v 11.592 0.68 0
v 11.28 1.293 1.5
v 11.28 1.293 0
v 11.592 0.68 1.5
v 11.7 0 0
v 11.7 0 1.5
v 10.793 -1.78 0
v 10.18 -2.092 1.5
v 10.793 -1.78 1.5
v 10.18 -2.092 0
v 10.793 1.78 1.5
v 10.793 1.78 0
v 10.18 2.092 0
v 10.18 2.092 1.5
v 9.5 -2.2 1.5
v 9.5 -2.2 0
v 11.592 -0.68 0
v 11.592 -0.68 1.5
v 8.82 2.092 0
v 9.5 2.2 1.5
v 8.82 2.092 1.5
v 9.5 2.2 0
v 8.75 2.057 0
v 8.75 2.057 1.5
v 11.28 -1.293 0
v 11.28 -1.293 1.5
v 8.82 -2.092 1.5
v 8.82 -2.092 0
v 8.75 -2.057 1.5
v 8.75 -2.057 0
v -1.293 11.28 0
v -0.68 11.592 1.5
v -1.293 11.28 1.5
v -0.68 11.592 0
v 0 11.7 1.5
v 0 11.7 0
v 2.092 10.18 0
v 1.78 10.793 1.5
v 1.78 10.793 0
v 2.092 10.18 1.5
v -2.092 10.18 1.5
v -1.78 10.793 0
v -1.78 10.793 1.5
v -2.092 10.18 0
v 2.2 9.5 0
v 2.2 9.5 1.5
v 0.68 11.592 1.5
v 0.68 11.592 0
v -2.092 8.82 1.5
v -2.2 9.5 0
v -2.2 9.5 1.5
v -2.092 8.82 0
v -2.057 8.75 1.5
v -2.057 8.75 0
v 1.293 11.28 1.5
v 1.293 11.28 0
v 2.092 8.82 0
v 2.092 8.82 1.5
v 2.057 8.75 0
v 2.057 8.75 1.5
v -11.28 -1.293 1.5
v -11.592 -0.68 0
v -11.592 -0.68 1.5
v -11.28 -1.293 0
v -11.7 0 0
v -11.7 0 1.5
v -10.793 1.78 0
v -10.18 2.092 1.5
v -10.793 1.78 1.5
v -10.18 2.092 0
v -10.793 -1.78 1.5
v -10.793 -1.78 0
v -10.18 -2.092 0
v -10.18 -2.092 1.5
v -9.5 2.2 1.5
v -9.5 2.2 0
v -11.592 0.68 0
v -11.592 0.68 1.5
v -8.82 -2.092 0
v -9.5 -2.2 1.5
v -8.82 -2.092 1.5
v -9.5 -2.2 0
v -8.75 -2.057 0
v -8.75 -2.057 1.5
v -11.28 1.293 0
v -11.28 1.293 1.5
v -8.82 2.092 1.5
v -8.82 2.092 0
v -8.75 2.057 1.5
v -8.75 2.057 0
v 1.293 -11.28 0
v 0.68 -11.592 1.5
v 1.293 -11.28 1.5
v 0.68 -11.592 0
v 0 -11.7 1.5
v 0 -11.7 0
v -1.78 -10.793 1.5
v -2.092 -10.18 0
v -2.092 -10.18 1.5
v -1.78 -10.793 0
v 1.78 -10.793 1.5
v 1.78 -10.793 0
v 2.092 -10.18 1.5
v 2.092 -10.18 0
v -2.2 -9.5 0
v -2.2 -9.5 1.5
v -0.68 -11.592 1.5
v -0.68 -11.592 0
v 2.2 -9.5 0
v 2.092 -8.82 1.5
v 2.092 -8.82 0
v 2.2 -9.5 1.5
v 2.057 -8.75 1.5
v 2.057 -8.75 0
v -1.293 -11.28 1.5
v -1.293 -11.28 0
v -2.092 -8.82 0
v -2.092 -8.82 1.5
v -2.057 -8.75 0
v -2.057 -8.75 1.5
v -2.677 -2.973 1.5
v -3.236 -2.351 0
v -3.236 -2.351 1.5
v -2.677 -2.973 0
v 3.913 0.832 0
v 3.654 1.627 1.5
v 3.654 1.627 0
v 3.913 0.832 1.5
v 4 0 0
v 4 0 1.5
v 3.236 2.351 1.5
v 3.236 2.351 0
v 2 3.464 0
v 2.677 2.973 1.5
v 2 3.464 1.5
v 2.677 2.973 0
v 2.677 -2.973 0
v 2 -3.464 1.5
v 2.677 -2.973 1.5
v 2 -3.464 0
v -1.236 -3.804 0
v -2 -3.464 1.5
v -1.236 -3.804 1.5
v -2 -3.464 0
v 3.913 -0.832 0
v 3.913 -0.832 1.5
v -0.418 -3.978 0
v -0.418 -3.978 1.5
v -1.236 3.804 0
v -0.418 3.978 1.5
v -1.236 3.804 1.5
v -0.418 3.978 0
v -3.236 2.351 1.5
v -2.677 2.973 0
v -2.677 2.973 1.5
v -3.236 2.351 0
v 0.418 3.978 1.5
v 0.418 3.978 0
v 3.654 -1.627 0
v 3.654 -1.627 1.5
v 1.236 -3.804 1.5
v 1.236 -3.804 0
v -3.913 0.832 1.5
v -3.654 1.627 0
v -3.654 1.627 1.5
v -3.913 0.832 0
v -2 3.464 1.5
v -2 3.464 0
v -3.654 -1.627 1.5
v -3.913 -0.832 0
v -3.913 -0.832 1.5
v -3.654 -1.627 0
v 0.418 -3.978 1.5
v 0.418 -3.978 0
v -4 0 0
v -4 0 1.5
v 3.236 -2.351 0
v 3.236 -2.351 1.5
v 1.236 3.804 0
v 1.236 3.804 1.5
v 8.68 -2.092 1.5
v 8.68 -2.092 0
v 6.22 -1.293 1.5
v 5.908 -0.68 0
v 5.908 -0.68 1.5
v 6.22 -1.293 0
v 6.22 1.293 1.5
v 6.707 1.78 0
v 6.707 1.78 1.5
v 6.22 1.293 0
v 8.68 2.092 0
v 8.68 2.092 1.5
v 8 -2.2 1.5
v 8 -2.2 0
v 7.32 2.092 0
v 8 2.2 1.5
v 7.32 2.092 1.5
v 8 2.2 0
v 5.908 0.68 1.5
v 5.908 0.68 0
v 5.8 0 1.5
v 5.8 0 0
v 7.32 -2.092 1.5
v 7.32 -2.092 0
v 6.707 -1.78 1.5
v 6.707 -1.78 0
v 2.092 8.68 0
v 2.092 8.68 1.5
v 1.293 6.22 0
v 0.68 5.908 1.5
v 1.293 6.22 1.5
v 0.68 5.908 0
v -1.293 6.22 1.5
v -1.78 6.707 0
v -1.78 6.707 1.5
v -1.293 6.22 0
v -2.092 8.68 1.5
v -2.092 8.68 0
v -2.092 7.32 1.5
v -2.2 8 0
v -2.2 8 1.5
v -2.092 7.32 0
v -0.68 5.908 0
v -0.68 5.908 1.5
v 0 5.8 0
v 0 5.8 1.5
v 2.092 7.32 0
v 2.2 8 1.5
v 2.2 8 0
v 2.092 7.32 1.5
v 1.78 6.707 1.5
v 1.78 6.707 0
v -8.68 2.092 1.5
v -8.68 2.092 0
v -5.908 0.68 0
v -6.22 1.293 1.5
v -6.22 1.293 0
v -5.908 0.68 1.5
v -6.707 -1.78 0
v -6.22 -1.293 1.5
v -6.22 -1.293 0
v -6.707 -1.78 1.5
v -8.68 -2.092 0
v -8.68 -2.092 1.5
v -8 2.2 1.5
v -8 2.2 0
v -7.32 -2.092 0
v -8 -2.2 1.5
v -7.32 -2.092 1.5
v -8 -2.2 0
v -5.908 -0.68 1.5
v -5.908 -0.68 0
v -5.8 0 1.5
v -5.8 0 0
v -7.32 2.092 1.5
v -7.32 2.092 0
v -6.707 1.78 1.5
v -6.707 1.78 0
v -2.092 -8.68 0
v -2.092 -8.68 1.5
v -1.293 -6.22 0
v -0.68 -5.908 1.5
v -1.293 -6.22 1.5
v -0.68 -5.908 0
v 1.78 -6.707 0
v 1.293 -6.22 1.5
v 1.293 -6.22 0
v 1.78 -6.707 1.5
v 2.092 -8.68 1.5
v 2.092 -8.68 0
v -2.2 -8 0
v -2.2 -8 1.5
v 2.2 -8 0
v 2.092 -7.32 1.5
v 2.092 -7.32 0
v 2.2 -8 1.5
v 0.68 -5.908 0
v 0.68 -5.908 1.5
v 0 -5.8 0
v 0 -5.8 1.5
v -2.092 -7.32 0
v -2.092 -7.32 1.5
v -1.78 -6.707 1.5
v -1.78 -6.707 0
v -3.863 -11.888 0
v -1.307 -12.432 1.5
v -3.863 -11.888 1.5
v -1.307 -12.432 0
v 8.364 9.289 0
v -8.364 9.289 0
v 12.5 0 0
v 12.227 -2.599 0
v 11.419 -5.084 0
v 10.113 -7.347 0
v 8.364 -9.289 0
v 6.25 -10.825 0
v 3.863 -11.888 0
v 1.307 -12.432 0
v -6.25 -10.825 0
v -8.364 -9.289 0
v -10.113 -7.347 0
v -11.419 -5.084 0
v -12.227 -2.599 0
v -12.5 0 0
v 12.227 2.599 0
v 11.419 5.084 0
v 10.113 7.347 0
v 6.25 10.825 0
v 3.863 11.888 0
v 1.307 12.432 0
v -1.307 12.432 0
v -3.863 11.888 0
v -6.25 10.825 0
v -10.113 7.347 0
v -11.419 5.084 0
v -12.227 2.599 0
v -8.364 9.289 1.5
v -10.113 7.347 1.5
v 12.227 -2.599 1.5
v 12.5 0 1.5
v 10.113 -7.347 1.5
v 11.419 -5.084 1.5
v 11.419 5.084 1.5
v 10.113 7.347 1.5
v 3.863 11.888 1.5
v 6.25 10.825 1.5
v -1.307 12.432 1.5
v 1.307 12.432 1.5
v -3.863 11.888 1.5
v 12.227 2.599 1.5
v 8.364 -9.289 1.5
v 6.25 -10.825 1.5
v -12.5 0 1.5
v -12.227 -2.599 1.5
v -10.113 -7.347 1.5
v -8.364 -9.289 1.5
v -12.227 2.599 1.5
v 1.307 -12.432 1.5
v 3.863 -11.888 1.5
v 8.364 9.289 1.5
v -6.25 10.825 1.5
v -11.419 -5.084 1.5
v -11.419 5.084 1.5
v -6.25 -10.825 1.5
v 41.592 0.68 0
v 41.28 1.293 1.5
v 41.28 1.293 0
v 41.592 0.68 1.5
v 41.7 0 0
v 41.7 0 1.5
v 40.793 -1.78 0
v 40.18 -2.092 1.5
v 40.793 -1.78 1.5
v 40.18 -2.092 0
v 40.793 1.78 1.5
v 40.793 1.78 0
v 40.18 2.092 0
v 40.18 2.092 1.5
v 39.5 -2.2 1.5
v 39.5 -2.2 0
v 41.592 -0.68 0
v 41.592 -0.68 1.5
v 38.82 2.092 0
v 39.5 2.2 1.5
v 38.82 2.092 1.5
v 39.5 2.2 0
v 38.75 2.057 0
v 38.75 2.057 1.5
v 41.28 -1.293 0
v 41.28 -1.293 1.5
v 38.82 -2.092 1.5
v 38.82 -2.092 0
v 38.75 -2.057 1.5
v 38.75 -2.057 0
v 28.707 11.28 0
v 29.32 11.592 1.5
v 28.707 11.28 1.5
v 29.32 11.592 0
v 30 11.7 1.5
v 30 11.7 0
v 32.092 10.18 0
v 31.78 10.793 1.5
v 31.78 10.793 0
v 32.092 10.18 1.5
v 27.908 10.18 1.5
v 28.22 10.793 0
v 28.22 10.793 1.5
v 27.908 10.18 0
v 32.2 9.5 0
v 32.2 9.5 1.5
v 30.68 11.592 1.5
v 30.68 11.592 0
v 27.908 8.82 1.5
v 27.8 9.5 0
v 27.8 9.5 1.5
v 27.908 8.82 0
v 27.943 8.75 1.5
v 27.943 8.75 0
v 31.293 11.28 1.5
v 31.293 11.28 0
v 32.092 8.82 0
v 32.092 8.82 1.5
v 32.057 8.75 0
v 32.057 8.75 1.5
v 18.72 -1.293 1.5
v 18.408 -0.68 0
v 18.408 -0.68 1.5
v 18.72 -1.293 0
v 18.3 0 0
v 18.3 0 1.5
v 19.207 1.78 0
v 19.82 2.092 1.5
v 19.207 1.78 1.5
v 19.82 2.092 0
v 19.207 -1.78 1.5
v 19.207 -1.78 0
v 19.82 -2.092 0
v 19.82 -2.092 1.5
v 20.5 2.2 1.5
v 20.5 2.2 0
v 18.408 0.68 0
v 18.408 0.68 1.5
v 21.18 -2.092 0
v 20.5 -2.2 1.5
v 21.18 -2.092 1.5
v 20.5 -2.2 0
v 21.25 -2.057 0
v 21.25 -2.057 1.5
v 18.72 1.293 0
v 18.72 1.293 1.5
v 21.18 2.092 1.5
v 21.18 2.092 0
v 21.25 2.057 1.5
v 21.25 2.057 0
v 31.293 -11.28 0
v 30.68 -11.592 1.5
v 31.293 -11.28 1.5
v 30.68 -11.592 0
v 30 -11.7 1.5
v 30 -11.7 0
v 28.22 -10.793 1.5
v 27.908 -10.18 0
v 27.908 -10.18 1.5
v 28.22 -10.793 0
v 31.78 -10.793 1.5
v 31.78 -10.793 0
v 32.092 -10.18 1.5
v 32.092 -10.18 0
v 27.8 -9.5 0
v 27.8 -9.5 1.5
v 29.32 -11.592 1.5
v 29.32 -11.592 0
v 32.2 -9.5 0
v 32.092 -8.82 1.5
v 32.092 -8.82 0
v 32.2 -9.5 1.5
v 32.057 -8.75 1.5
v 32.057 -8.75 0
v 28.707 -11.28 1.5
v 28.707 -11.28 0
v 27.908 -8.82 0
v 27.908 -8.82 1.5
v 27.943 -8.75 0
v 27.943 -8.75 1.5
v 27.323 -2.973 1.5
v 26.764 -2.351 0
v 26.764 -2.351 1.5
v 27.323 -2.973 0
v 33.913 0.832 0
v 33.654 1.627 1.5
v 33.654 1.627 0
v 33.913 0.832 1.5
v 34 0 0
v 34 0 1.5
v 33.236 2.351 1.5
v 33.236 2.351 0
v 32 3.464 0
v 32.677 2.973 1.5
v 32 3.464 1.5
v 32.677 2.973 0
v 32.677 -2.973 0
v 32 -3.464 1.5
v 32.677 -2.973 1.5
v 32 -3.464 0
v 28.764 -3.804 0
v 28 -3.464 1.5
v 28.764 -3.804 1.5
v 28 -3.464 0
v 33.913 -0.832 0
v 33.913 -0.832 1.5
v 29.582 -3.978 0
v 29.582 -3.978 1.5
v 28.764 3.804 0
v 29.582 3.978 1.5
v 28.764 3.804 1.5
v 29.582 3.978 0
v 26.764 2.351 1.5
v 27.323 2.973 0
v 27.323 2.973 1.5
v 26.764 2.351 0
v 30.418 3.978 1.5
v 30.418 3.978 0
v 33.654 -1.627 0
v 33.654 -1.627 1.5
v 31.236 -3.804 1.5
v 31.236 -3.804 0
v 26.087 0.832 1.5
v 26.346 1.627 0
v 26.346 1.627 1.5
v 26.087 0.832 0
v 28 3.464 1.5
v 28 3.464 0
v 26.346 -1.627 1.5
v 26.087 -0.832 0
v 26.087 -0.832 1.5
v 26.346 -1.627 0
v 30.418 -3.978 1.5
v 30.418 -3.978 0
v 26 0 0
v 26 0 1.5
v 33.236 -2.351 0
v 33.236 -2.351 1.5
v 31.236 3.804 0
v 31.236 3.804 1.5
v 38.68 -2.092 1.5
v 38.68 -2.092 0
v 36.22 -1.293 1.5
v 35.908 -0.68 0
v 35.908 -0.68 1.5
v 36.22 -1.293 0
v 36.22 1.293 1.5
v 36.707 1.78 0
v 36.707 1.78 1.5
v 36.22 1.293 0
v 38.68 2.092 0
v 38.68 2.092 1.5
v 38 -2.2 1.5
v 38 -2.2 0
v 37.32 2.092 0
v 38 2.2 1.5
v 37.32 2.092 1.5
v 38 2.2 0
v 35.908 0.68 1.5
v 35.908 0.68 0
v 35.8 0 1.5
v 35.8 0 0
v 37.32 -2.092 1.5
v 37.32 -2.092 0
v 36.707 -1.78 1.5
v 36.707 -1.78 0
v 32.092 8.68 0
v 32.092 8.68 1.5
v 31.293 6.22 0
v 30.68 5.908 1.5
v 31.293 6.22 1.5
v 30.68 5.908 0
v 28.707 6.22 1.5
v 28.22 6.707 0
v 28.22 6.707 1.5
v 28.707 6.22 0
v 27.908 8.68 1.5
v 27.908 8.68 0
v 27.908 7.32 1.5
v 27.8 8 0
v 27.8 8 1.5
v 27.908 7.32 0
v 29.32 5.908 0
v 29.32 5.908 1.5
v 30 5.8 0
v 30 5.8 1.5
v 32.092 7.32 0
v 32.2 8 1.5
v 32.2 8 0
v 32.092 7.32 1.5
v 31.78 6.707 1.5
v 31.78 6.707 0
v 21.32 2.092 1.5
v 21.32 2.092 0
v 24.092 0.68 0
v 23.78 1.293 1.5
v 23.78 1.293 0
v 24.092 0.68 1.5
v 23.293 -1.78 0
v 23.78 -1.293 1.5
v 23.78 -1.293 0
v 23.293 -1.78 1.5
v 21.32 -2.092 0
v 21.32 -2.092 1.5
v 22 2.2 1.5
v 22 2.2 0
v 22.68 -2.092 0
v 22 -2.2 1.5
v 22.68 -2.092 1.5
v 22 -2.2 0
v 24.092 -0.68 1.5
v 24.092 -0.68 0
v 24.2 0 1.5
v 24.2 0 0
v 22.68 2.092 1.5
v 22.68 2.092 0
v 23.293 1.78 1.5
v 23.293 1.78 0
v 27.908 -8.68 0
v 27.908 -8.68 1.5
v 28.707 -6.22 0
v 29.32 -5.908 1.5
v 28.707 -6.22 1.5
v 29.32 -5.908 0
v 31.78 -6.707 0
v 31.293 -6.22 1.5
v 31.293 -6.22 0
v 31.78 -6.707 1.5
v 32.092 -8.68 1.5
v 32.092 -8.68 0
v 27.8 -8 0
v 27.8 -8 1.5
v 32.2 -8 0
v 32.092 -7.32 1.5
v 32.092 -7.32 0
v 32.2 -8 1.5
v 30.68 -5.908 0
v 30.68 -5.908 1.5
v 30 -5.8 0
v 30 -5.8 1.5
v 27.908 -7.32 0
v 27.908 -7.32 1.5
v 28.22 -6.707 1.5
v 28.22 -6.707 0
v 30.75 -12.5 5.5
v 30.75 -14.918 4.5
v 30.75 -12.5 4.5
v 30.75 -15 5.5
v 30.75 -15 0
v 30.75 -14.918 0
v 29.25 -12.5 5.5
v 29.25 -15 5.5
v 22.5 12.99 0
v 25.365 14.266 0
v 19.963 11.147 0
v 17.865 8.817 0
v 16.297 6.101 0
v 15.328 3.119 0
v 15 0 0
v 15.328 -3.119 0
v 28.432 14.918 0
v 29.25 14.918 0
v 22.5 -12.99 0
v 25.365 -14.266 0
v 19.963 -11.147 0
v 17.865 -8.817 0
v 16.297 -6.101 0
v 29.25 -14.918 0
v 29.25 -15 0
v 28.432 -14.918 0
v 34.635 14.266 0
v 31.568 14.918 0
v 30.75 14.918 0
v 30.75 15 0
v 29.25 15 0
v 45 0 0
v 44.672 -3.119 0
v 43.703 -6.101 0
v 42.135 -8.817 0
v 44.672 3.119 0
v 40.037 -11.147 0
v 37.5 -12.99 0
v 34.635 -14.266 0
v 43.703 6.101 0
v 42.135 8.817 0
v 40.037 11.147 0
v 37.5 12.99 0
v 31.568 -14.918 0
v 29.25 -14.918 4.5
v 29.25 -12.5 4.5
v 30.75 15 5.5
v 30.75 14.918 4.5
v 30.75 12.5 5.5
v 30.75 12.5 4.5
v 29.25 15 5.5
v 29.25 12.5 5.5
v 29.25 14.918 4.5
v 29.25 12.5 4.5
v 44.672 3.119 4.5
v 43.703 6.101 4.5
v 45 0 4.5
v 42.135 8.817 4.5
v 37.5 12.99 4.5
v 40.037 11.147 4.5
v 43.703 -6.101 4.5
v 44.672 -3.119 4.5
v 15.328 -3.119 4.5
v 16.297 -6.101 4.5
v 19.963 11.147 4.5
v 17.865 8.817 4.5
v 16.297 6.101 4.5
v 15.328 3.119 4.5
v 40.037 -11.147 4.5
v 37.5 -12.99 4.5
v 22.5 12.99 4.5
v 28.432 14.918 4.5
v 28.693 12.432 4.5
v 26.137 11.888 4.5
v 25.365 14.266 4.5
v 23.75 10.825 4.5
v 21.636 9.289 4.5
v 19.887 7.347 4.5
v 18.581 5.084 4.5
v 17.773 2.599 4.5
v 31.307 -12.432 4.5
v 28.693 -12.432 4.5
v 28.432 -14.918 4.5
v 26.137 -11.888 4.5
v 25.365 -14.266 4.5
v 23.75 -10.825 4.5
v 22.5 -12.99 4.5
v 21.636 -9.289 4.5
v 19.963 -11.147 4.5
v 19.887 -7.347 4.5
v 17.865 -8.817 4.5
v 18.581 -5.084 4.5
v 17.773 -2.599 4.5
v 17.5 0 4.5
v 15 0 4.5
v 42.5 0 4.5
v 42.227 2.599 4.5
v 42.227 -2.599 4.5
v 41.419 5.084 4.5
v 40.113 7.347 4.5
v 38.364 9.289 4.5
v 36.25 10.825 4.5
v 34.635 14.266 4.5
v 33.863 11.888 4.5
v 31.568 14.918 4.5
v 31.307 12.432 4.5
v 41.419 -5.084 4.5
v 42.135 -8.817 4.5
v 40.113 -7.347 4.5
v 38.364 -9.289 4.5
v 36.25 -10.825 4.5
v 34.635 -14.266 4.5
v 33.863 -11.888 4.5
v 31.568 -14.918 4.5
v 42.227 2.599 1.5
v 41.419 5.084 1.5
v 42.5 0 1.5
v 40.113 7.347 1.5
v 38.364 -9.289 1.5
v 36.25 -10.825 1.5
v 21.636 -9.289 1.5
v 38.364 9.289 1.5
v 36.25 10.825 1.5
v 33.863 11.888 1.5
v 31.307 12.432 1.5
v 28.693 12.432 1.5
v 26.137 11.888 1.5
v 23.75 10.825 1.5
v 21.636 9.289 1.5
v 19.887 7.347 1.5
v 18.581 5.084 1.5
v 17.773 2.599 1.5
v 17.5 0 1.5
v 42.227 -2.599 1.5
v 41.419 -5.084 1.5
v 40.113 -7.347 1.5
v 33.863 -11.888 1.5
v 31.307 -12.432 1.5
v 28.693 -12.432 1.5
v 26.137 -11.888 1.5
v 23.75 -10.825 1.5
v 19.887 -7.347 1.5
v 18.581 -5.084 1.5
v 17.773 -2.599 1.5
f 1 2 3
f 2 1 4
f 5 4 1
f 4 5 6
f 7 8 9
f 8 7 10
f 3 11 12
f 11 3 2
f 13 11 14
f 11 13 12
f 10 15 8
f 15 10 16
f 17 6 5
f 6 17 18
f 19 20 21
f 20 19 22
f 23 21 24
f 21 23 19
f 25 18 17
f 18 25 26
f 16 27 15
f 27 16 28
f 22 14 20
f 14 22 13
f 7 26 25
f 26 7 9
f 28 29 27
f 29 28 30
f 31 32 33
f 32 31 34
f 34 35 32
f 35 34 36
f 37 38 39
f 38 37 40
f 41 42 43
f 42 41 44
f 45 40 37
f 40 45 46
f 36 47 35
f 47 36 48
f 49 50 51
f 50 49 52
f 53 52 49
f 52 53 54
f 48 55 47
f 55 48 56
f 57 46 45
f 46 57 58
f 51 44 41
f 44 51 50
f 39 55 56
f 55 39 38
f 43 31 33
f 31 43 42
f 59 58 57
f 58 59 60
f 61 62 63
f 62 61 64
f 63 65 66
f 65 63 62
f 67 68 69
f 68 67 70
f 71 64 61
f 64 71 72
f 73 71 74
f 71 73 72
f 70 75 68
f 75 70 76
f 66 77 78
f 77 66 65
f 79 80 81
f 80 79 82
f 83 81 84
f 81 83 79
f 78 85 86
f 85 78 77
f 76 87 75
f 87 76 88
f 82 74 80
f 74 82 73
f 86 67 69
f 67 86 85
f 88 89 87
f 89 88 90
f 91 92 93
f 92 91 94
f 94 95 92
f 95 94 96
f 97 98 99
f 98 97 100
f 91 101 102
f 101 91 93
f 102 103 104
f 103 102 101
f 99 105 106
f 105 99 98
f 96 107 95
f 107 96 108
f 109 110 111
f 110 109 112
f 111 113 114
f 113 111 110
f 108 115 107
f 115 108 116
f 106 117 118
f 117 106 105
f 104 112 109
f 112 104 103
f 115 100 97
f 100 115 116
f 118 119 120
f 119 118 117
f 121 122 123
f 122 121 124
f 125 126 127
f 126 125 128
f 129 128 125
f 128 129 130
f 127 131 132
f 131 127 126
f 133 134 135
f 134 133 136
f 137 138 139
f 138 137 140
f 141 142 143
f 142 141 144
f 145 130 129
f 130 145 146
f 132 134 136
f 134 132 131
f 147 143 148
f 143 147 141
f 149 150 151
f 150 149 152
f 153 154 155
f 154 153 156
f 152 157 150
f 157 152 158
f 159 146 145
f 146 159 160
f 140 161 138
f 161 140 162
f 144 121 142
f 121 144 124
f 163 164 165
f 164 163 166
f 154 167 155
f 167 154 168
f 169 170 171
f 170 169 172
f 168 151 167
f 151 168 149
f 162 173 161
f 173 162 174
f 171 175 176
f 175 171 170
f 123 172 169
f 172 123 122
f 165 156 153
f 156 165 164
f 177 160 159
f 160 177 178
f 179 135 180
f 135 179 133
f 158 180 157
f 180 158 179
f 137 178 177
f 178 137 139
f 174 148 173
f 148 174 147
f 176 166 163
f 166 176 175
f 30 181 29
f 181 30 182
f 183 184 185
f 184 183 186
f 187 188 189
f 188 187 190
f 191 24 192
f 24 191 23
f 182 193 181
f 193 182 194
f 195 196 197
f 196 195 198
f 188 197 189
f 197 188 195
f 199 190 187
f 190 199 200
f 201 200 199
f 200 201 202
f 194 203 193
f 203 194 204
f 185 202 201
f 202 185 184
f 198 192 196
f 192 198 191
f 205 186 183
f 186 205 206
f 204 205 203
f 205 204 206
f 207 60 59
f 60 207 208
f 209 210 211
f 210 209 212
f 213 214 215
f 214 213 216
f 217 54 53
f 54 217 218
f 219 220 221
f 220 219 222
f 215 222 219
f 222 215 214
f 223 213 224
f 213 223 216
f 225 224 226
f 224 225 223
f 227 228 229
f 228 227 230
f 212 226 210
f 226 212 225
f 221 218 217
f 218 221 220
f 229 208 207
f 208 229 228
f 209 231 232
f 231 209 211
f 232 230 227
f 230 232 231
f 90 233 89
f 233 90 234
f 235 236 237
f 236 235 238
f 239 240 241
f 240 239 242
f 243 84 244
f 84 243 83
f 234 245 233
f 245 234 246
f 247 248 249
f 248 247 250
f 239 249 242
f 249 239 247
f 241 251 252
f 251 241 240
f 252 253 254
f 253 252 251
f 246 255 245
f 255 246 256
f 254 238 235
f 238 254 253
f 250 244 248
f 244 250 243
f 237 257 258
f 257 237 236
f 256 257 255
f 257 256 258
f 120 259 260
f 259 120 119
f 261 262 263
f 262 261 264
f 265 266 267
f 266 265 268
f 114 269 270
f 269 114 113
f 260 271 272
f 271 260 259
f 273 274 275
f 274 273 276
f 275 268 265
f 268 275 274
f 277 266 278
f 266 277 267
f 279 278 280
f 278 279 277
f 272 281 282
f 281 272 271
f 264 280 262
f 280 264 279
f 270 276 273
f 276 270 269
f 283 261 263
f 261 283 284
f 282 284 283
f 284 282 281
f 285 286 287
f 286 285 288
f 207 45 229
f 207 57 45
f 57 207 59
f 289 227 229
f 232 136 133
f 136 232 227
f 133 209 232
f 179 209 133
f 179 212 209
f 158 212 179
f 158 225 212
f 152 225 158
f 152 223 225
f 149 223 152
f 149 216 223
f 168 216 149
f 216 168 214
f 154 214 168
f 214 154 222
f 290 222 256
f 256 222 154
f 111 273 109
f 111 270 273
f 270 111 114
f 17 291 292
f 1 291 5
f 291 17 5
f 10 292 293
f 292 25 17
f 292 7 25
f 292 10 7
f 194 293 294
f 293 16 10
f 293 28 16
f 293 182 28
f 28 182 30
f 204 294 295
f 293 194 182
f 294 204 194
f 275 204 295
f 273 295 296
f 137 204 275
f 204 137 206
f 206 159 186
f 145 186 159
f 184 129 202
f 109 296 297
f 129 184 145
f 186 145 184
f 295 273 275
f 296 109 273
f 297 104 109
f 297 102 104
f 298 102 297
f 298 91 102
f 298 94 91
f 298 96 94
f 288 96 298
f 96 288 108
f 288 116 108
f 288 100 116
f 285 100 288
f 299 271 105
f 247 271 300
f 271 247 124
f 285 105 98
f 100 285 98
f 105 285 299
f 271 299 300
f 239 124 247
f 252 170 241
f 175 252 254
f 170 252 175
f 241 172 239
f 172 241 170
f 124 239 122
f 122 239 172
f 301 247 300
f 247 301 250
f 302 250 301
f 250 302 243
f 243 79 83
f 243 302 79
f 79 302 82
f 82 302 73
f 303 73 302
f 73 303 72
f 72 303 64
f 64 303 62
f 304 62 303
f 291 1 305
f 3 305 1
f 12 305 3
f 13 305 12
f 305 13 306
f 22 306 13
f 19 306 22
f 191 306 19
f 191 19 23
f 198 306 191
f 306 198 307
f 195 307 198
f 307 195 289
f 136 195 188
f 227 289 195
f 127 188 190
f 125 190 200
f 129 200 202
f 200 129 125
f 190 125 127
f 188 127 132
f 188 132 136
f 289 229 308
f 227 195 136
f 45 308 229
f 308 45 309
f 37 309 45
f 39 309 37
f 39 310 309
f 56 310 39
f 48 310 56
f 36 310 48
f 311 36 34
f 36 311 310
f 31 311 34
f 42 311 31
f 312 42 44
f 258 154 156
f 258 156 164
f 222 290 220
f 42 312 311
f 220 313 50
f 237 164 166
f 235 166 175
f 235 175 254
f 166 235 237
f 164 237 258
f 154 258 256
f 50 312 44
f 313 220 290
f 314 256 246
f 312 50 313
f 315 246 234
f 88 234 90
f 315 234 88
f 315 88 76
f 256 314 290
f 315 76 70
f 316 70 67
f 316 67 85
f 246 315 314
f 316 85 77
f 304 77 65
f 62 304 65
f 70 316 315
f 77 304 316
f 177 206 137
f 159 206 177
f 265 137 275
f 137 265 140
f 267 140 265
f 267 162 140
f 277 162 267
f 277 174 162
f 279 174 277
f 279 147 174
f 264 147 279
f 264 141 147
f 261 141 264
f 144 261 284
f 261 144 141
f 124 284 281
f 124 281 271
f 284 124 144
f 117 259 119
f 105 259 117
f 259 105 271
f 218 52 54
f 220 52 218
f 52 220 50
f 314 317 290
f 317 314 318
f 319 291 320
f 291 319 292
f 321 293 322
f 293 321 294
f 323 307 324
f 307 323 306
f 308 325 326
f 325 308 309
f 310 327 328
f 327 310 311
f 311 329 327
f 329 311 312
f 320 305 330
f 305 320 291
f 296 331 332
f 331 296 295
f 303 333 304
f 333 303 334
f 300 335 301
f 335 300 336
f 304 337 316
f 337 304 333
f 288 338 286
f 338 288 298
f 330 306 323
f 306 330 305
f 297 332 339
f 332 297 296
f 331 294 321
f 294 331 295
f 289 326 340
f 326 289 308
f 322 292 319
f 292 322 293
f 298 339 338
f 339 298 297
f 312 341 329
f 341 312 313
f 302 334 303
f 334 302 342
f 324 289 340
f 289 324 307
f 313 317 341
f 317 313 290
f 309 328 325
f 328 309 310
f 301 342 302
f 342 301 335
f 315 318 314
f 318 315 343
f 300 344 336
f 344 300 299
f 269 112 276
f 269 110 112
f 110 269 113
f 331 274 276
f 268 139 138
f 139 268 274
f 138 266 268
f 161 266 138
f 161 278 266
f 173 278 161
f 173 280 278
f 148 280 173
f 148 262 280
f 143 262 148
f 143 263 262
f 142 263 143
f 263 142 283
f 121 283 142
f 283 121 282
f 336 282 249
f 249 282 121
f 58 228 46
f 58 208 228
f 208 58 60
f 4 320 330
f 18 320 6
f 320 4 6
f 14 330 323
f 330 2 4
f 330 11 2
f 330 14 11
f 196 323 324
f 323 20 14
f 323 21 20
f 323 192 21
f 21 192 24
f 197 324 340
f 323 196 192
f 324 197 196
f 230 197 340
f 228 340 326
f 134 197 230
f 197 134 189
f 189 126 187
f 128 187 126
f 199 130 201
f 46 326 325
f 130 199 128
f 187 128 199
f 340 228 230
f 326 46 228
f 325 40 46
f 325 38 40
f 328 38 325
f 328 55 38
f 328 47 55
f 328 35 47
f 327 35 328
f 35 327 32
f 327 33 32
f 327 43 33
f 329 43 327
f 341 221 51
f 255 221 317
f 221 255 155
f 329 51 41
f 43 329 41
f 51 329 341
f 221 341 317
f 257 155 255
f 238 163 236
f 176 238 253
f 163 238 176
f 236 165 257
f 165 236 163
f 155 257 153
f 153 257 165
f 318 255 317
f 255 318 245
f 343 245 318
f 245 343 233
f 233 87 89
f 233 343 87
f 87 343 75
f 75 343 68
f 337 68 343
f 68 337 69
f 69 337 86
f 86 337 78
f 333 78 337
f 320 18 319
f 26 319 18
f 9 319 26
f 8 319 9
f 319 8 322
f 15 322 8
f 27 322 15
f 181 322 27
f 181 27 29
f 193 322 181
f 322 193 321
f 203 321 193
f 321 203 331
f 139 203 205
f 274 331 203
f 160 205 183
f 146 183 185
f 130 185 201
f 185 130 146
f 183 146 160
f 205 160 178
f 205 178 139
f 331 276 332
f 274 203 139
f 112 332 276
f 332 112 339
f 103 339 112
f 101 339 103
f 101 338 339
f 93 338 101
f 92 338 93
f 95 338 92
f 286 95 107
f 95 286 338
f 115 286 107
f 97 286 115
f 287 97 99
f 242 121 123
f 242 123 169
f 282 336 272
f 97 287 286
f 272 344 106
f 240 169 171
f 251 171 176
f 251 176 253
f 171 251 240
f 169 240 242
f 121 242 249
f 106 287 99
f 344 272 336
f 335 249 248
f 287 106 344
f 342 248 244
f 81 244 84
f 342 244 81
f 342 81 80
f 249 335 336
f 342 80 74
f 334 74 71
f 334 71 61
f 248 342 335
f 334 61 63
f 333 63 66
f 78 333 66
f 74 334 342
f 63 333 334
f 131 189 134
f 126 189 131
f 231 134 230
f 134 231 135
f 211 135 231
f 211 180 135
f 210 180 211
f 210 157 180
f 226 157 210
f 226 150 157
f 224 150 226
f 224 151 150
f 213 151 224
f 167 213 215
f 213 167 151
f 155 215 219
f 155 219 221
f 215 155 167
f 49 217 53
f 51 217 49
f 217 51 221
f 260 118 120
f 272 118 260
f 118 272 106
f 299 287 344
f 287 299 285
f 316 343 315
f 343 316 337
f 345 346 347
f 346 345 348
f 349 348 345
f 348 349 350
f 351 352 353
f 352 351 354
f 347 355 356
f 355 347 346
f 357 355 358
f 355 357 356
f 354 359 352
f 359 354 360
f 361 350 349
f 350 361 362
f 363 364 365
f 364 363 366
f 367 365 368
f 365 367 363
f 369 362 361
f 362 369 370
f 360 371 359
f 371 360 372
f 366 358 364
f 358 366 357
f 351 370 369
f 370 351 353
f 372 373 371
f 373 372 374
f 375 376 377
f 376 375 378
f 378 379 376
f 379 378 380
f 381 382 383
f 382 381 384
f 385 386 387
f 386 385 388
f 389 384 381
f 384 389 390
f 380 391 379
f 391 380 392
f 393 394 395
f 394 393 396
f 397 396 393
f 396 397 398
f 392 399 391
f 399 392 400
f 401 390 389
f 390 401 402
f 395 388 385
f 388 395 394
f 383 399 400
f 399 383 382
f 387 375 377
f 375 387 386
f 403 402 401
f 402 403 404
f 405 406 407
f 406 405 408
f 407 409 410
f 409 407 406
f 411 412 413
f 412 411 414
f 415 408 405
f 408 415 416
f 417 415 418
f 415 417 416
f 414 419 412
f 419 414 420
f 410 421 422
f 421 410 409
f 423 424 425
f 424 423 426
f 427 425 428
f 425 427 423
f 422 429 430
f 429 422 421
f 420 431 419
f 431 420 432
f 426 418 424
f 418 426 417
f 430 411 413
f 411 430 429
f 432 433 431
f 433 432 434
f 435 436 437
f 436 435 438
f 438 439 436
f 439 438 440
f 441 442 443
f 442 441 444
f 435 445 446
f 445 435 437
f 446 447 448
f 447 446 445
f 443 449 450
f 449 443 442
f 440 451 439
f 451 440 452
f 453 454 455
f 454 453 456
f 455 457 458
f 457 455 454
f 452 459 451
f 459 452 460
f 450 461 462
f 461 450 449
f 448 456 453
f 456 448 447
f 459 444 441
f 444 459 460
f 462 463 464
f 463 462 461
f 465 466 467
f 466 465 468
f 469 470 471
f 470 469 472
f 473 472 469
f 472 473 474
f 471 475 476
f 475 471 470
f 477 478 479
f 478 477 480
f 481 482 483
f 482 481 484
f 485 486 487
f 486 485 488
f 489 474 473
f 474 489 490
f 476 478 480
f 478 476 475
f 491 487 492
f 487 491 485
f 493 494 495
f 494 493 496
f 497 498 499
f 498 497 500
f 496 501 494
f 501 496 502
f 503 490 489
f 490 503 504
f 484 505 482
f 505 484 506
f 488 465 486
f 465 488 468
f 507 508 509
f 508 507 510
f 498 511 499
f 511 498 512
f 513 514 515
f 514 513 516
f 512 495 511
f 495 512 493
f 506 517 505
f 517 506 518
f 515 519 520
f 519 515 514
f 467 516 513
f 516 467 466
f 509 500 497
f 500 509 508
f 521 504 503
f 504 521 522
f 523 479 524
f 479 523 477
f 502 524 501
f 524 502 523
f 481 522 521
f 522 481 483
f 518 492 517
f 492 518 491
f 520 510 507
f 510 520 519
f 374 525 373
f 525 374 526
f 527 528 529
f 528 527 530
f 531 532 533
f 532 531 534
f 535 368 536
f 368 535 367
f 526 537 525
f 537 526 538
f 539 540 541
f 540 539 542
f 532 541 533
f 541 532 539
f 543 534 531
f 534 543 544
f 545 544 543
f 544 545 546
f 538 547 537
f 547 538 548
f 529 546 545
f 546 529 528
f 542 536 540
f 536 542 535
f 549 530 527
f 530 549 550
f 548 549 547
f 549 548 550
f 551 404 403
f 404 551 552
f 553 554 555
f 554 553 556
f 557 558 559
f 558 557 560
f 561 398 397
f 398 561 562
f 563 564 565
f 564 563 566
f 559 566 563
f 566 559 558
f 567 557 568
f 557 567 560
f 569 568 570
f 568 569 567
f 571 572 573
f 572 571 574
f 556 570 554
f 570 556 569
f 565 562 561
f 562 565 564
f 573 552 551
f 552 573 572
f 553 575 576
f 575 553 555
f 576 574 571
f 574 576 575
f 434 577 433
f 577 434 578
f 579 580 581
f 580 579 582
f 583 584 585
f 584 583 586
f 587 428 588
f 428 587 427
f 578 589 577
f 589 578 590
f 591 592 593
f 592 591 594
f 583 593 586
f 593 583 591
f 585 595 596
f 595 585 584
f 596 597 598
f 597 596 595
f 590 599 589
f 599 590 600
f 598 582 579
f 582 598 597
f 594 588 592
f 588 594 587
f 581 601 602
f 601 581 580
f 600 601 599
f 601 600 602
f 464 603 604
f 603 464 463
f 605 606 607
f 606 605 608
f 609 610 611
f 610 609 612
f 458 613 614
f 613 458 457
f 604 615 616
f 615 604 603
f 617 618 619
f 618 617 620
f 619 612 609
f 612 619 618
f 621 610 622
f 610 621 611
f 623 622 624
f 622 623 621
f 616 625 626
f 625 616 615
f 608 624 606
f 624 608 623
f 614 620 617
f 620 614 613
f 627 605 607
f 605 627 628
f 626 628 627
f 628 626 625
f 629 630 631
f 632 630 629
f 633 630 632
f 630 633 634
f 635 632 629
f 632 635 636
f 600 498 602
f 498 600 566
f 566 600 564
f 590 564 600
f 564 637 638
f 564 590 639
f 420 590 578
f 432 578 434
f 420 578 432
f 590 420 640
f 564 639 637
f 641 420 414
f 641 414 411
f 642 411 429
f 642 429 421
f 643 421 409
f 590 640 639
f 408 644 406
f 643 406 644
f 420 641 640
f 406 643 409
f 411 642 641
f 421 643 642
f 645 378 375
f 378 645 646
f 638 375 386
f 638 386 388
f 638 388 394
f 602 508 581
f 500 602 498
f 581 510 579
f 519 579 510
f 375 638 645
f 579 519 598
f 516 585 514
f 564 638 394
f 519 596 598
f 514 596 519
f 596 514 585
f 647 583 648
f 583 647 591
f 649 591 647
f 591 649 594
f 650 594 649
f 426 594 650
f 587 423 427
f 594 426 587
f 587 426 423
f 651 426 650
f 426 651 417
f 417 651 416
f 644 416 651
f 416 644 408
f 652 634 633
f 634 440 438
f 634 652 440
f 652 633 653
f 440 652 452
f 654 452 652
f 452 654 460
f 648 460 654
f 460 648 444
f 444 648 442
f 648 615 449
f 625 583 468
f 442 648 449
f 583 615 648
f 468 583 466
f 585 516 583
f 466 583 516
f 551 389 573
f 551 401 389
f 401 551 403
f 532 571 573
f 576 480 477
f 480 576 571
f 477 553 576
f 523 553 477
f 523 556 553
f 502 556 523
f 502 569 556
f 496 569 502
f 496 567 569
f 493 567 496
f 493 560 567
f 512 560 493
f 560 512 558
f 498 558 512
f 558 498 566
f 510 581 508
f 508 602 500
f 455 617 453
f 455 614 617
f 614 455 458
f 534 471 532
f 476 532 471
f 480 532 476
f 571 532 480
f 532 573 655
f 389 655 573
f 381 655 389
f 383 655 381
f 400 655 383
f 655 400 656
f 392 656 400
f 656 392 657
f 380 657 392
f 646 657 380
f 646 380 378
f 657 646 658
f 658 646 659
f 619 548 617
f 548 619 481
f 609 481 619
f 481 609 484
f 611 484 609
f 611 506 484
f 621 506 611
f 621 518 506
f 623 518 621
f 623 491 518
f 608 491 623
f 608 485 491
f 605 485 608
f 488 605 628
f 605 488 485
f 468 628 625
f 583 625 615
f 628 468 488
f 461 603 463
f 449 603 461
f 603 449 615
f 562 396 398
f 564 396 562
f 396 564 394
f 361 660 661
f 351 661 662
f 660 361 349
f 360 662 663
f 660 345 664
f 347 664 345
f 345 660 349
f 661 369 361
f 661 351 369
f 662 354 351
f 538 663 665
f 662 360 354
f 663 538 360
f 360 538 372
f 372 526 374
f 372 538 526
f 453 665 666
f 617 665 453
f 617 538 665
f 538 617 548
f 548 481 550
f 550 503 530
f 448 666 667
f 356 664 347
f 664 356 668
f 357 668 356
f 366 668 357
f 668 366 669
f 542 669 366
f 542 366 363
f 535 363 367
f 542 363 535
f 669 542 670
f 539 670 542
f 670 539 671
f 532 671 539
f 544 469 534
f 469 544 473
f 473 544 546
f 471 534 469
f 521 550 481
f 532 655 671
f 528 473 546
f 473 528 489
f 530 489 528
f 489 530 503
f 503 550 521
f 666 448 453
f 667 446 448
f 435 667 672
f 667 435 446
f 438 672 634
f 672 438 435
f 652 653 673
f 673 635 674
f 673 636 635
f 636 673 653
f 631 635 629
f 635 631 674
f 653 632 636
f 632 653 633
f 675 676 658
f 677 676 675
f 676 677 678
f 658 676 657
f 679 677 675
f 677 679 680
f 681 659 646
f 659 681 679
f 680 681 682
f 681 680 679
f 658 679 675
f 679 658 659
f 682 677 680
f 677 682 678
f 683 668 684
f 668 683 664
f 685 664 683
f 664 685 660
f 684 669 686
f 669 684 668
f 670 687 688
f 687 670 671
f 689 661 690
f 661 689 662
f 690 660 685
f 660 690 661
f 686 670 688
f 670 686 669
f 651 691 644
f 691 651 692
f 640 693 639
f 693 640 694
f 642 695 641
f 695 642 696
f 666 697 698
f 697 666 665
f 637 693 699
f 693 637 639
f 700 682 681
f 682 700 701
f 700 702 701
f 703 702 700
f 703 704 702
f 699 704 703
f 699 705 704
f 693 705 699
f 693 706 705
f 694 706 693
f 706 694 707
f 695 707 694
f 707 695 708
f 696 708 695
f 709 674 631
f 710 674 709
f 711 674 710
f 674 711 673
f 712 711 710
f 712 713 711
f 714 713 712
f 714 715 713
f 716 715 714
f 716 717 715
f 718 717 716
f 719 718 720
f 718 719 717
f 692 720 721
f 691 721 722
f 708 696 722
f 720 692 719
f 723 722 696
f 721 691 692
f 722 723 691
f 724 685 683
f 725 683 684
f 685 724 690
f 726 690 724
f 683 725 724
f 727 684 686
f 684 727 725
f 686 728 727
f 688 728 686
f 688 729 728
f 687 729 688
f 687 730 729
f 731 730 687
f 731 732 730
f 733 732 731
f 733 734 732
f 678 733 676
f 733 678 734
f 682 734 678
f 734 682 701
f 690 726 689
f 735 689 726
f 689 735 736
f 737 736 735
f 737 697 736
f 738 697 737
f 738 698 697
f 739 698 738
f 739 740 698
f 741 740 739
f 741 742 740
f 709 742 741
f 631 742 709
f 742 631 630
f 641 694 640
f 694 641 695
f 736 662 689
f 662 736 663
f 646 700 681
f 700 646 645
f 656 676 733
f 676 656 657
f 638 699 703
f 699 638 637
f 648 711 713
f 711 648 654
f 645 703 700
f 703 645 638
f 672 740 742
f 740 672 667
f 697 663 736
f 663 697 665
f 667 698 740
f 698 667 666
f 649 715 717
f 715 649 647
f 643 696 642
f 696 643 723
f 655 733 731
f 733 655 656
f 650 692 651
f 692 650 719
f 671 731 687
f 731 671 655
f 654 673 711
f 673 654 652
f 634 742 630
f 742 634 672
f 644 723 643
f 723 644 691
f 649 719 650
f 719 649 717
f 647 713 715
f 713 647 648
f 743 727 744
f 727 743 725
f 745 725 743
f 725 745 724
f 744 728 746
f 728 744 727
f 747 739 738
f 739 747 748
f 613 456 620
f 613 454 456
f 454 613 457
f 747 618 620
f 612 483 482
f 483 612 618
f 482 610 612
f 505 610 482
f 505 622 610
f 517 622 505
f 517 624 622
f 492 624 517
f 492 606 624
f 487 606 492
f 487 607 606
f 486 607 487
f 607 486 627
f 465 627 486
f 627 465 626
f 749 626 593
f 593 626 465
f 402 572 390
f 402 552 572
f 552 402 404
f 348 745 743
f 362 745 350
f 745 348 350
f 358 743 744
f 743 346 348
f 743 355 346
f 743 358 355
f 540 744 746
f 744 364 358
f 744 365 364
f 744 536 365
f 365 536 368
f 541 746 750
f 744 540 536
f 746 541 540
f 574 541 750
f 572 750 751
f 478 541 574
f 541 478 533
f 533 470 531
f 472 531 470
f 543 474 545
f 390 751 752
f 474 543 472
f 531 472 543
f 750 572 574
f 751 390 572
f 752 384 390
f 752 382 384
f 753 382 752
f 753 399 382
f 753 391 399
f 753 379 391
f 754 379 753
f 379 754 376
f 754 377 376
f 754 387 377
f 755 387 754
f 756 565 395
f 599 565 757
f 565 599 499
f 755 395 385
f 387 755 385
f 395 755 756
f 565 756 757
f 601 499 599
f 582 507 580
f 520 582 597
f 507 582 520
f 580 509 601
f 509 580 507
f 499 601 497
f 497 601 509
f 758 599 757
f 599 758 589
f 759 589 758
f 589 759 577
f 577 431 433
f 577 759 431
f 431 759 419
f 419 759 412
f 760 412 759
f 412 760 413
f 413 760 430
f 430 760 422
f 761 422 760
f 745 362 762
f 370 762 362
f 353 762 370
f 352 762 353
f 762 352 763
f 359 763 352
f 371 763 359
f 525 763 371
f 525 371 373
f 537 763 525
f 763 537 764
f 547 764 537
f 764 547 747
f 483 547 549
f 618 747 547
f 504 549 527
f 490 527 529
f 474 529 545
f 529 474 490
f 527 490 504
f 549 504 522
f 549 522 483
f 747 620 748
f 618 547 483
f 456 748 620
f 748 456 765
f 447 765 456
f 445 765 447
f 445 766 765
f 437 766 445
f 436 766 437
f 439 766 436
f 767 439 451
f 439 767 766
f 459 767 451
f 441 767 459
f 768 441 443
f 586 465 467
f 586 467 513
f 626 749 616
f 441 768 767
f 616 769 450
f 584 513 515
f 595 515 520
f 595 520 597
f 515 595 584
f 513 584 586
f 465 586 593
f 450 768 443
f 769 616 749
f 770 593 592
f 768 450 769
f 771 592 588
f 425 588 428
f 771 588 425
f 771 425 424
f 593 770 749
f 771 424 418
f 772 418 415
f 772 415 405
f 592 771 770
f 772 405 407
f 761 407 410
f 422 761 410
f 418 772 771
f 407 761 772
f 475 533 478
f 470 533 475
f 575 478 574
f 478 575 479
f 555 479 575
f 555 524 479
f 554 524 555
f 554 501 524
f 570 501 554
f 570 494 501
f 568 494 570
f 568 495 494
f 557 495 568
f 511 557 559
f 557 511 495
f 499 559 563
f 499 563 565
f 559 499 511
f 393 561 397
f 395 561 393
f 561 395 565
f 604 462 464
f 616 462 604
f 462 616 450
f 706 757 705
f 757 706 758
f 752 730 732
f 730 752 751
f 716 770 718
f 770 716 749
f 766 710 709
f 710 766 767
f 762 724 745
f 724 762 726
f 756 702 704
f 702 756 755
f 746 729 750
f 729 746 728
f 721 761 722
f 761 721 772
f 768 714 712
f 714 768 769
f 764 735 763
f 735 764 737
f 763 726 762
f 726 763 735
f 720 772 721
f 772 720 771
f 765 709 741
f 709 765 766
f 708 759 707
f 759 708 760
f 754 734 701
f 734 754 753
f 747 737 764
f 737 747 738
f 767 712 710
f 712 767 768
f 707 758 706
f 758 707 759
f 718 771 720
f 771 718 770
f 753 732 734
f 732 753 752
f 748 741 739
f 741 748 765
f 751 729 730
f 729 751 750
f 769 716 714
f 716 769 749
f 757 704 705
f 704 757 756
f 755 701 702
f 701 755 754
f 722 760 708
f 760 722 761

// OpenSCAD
// file: dronePlates.scad
/**
 * dronePlates.scad
 * Plate library
 *
 * GNU GPL V3
 * @author: Victor Potenciano
 */

m3Rad = 3.4/2;
cornerR = 4;

/**
 *
 */
module helperDisk(diameter) {
	cylinder(r = diameter/2, h = 0.6, $fn=20);
}

/**
 *
 */
module roundedRect(size, radius) {
	x = size[0];
	y = size[1];
	z = size[2];

	linear_extrude(height=z)
	hull() {
	// place 4 circles in the corners, with the given radius
	translate([(-x/2)+(radius/2), (-y/2)+(radius/2), 0]){ circle(r=radius); }
	translate([(x/2)-(radius/2), (-y/2)+(radius/2), 0]){ circle(r=radius); }
	translate([(-x/2)+(radius/2), (y/2)-(radius/2), 0]){ circle(r=radius); }
	translate([(x/2)-(radius/2), (y/2)-(radius/2), 0]){ circle(r=radius); }
	}
}

/**
 * rounded rectangle triangle with corner at origin
 */
module roundedTriangle(size, radius) {
	x = size[0];
	y = size[1];
	z = size[2];

	linear_extrude(height=z)
	hull() {
	translate([radius, radius, 0]){ circle(r=radius); }
	translate([x-radius, radius, 0]){ circle(r=radius); }
	translate([radius, y-radius, 0]){ circle(r=radius); }
	}
}

/**
 *
 */
module roundRectPlate(w, l, plateThick=3) {
	difference(){
		roundedRect([l+m3Rad*1.75,w+m3Rad*1.75,plateThick], cornerR);
		translate([l/2, w/2, -0.5]) { cylinder(h = plateThick+1, r = m3Rad, $fn=30); }
		translate([-l/2, w/2, -0.5]) { cylinder(h = plateThick+1, r = m3Rad, $fn=30); }
		translate([l/2, -w/2, -0.5]) { cylinder(h = plateThick+1, r = m3Rad, $fn=30); }
		translate([-l/2, -w/2, -0.5]) { cylinder(h = plateThick+1, r = m3Rad, $fn=30); }
	}
}

/**
 *
 */
module crossSquarePlate(l, thick=3) {
	inDist = cornerR*2+4;
	trianL = sqrt((l*l)/2)-inDist;
	centerR = 4;

	difference(){
		roundRectPlate(l, l, thick);
		translate([0, centerR, -0.5]) { 
			rotate([0,0,45]){ roundedTriangle([trianL,trianL,thick+1], cornerR-2); }
		}
		translate([0, -centerR, -0.5]) { 
			rotate([0,0,225]){ roundedTriangle([trianL,trianL,thick+1], cornerR-2); }
		}
		translate([-centerR, 0, -0.5]) { 
			rotate([0,0,135]){ roundedTriangle([trianL,trianL,thick+1], cornerR-2); }
		}
		translate([centerR, 0, -0.5]) { 
			rotate([0,0,-45]){ roundedTriangle([trianL,trianL,thick+1], cornerR-2); }
		}
	}
}

/**
 *
 */
module hShapePlate(w, l, thick=4) {
	inDist = cornerR*2+1;

	difference(){
		roundRectPlate(w, l, thick);
		translate([0, w/4, -0.5]) { roundedRect([l-inDist,w/2-inDist,thick+1], cornerR-2); }
		translate([0, -w/4, -0.5]) { roundedRect([l-inDist,w/2-inDist,thick+1], cornerR-2); }
	}
}

/**
 *
 */
module motorCircleMount(inDia, outDia, thick=3, extraH=false, d1=19, d2=16, holeR=m3Rad ) {
	difference(){
		cylinder(h = thick, r = outDia/2, $fn=30);
		motorCircleMountHoles(inDia, outDia, thick, extraH, d1=d1, d2=d2, holeR=holeR);
	}
}

/**
 *
 */
module motorCircleMountHoles(inDia, outDia, thick=3, extraH=false, d1=19, d2=16, d3=25, holeR=m3Rad) {
	translate([0, 0, -0.5]) { cylinder(h = thick+1, r = inDia/2, $fn=30); }

	for(i=[0:3]) {
		rotate([0,0,90*i]){
		translate([d1/2, 0, -0.5]) cylinder(h = thick+1, r = holeR, $fn=20);
		translate([d2/2, 0, -0.5]) cylinder(h = thick+1, r = holeR, $fn=20);
		translate([d2/2, -holeR, -0.5]) cube(size = [(d1-d2)/2,holeR*2,thick+1]);
		}
	}
	
	if(extraH==true){	
		for(i=[-1,1]) translate([i*d3/2, 0, -0.5]) { cylinder(h = thick+1, r = holeR, $fn=30); }
	}
}

/**
 *
 */
module motorRectMount(w, l, inDia, thick=3) {
	d1=19;
	d2=16;

	difference(){
		roundRectPlate(w, l, thick);
		translate([0, 0, -0.5]) { cylinder(h = thick+1, r = inDia/2, $fn=30); }
		translate([0, d1/2, -0.5]) { cylinder(h = thick+1, r = m3Rad, $fn=30); }
		translate([0, -d1/2, -0.5]) { cylinder(h = thick+1, r = m3Rad, $fn=30); }
		translate([d2/2, 0, -0.5]) { cylinder(h = thick+1, r = m3Rad, $fn=30); }
		translate([-d2/2, 0, -0.5]) { cylinder(h = thick+1, r = m3Rad, $fn=30); }
	}
}

/**
 *
 */
module tube(inDia, outDia, height) {
	difference(){
		cylinder(h = height, r = outDia/2, $fn=50);
		translate([0, 0, -0.5]) { cylinder(h = height+1, r = inDia/2, $fn=30); }
	}
}

/**
 *
 */
module squareTube(inDia, outDia, height) {
	translate([0,0,height/2]){
	difference(){
		cube(size = [outDia,outDia,height], center = true);
		cube(size = [inDia,inDia,height+1], center = true);
	}
	}
}

/**
 *
 */
module djiFlamewheelHoles(height) {
	a = 23;
	b = 16;
	c = 19.5;
	
	translate([a/2, c/2, 0]) { cylinder(h = height, r = m3Rad, $fn=30); }
	translate([-a/2, c/2, 0]) { cylinder(h = height, r = m3Rad, $fn=30); }
	translate([b/2, -c/2, 0]) { cylinder(h = height, r = m3Rad, $fn=30); }
	translate([-b/2, -c/2, 0]) { cylinder(h = height, r = m3Rad, $fn=30); }
}

/**
 *
 */
module djiFlamewheelHolesBotton(height) {
	a1 = 21;
	c = 19.5;
	
	translate([a1/2, c/2, 0]) { cylinder(h = height, r = m3Rad, $fn=30); }
	translate([-a1/2, c/2, 0]) { cylinder(h = height, r = m3Rad, $fn=30); }
}

/**
 *
 */
module propeller(size){
union(){
difference(){
	cylinder(h = 3, r = size/2, center=true, $fn=30);
	cylinder(h = 3.1, r = size/2-2, center=true, $fn=30); 
}
for( i = [-1,1] ){
rotate([0,0,45*i]){ cube(size = [size,4,1], center = true); }
}
}
}

/**
 *
 */
module slot(length, height, rad){
for(i=[-1,1]) translate([i*length/2,0,0]) cylinder(h = height, r = rad, $fn=30);
translate([0,0,height/2]) cube(size = [length,rad*2,height], center = true);
}

 

////////////////////////
// Examples:
////////////////////////

motorCircleMount(8, 25, 3.5);

//roundedRect([50,50,3], 4);

//hShapePlate(79, 25);

//rotate([0,0,45]){roundedTriangle([40,40,3], 4);}

//crossSquarePlate(45, 4);

/*
union(){
motorRectMount(21, 18, 8, 4);
translate([9, 10.5, 0]) {tube(m3Rad*2, 6.5, 6);}
}
*/

/*
difference(){
union(){
hShapePlate(50, 30, 3.5);
translate([-4,-25,0]){cube(size = [8,50,3.5]);}
rotate([0, 0, 45]) {motorCircleMount(8, 35, 3.5);}
}
cylinder(h = 10, r = 4, $fn=100, center=true);
}
*/

//rotate([90,0,0]){ tube(5,10,20); }
//translate([20,0,0]){ squareTube(5, 10, 20); }
// main file
use <dronePlates.scad>;

m3Rad = 3.4/2;
m4Rad = 4.4/2;
diameter = 25;
thick = 1.5;
height = thick*2 + 1.5;

module motorHoles(){
    motorCircleMountHoles(8, diameter, thick=thick, d1=19, d2=19, holeR=m4Rad);
    motorCircleMountHoles(8, diameter, thick=thick, d1=16, d2=16, holeR=m4Rad);
}

difference(){
    cylinder(r=diameter/2, h=thick, $fn=30);
    motorHoles();
}

translate([30,0,0]){
difference(){
    union(){
        cylinder(r=(diameter+5)/2, h=height, $fn=30);
        for(i=[-1,1]){
            translate([0,i*(diameter+2.5)/2, (height+1)/2]){
                cube(size=[1.5,2.5,height+1], center=true);
            }
        }
    }
    
    translate([0,0,thick]){
        cylinder(r=diameter/2, h=height - 1.5 +0.1, $fn=30);
    }
    motorHoles();
}
}
